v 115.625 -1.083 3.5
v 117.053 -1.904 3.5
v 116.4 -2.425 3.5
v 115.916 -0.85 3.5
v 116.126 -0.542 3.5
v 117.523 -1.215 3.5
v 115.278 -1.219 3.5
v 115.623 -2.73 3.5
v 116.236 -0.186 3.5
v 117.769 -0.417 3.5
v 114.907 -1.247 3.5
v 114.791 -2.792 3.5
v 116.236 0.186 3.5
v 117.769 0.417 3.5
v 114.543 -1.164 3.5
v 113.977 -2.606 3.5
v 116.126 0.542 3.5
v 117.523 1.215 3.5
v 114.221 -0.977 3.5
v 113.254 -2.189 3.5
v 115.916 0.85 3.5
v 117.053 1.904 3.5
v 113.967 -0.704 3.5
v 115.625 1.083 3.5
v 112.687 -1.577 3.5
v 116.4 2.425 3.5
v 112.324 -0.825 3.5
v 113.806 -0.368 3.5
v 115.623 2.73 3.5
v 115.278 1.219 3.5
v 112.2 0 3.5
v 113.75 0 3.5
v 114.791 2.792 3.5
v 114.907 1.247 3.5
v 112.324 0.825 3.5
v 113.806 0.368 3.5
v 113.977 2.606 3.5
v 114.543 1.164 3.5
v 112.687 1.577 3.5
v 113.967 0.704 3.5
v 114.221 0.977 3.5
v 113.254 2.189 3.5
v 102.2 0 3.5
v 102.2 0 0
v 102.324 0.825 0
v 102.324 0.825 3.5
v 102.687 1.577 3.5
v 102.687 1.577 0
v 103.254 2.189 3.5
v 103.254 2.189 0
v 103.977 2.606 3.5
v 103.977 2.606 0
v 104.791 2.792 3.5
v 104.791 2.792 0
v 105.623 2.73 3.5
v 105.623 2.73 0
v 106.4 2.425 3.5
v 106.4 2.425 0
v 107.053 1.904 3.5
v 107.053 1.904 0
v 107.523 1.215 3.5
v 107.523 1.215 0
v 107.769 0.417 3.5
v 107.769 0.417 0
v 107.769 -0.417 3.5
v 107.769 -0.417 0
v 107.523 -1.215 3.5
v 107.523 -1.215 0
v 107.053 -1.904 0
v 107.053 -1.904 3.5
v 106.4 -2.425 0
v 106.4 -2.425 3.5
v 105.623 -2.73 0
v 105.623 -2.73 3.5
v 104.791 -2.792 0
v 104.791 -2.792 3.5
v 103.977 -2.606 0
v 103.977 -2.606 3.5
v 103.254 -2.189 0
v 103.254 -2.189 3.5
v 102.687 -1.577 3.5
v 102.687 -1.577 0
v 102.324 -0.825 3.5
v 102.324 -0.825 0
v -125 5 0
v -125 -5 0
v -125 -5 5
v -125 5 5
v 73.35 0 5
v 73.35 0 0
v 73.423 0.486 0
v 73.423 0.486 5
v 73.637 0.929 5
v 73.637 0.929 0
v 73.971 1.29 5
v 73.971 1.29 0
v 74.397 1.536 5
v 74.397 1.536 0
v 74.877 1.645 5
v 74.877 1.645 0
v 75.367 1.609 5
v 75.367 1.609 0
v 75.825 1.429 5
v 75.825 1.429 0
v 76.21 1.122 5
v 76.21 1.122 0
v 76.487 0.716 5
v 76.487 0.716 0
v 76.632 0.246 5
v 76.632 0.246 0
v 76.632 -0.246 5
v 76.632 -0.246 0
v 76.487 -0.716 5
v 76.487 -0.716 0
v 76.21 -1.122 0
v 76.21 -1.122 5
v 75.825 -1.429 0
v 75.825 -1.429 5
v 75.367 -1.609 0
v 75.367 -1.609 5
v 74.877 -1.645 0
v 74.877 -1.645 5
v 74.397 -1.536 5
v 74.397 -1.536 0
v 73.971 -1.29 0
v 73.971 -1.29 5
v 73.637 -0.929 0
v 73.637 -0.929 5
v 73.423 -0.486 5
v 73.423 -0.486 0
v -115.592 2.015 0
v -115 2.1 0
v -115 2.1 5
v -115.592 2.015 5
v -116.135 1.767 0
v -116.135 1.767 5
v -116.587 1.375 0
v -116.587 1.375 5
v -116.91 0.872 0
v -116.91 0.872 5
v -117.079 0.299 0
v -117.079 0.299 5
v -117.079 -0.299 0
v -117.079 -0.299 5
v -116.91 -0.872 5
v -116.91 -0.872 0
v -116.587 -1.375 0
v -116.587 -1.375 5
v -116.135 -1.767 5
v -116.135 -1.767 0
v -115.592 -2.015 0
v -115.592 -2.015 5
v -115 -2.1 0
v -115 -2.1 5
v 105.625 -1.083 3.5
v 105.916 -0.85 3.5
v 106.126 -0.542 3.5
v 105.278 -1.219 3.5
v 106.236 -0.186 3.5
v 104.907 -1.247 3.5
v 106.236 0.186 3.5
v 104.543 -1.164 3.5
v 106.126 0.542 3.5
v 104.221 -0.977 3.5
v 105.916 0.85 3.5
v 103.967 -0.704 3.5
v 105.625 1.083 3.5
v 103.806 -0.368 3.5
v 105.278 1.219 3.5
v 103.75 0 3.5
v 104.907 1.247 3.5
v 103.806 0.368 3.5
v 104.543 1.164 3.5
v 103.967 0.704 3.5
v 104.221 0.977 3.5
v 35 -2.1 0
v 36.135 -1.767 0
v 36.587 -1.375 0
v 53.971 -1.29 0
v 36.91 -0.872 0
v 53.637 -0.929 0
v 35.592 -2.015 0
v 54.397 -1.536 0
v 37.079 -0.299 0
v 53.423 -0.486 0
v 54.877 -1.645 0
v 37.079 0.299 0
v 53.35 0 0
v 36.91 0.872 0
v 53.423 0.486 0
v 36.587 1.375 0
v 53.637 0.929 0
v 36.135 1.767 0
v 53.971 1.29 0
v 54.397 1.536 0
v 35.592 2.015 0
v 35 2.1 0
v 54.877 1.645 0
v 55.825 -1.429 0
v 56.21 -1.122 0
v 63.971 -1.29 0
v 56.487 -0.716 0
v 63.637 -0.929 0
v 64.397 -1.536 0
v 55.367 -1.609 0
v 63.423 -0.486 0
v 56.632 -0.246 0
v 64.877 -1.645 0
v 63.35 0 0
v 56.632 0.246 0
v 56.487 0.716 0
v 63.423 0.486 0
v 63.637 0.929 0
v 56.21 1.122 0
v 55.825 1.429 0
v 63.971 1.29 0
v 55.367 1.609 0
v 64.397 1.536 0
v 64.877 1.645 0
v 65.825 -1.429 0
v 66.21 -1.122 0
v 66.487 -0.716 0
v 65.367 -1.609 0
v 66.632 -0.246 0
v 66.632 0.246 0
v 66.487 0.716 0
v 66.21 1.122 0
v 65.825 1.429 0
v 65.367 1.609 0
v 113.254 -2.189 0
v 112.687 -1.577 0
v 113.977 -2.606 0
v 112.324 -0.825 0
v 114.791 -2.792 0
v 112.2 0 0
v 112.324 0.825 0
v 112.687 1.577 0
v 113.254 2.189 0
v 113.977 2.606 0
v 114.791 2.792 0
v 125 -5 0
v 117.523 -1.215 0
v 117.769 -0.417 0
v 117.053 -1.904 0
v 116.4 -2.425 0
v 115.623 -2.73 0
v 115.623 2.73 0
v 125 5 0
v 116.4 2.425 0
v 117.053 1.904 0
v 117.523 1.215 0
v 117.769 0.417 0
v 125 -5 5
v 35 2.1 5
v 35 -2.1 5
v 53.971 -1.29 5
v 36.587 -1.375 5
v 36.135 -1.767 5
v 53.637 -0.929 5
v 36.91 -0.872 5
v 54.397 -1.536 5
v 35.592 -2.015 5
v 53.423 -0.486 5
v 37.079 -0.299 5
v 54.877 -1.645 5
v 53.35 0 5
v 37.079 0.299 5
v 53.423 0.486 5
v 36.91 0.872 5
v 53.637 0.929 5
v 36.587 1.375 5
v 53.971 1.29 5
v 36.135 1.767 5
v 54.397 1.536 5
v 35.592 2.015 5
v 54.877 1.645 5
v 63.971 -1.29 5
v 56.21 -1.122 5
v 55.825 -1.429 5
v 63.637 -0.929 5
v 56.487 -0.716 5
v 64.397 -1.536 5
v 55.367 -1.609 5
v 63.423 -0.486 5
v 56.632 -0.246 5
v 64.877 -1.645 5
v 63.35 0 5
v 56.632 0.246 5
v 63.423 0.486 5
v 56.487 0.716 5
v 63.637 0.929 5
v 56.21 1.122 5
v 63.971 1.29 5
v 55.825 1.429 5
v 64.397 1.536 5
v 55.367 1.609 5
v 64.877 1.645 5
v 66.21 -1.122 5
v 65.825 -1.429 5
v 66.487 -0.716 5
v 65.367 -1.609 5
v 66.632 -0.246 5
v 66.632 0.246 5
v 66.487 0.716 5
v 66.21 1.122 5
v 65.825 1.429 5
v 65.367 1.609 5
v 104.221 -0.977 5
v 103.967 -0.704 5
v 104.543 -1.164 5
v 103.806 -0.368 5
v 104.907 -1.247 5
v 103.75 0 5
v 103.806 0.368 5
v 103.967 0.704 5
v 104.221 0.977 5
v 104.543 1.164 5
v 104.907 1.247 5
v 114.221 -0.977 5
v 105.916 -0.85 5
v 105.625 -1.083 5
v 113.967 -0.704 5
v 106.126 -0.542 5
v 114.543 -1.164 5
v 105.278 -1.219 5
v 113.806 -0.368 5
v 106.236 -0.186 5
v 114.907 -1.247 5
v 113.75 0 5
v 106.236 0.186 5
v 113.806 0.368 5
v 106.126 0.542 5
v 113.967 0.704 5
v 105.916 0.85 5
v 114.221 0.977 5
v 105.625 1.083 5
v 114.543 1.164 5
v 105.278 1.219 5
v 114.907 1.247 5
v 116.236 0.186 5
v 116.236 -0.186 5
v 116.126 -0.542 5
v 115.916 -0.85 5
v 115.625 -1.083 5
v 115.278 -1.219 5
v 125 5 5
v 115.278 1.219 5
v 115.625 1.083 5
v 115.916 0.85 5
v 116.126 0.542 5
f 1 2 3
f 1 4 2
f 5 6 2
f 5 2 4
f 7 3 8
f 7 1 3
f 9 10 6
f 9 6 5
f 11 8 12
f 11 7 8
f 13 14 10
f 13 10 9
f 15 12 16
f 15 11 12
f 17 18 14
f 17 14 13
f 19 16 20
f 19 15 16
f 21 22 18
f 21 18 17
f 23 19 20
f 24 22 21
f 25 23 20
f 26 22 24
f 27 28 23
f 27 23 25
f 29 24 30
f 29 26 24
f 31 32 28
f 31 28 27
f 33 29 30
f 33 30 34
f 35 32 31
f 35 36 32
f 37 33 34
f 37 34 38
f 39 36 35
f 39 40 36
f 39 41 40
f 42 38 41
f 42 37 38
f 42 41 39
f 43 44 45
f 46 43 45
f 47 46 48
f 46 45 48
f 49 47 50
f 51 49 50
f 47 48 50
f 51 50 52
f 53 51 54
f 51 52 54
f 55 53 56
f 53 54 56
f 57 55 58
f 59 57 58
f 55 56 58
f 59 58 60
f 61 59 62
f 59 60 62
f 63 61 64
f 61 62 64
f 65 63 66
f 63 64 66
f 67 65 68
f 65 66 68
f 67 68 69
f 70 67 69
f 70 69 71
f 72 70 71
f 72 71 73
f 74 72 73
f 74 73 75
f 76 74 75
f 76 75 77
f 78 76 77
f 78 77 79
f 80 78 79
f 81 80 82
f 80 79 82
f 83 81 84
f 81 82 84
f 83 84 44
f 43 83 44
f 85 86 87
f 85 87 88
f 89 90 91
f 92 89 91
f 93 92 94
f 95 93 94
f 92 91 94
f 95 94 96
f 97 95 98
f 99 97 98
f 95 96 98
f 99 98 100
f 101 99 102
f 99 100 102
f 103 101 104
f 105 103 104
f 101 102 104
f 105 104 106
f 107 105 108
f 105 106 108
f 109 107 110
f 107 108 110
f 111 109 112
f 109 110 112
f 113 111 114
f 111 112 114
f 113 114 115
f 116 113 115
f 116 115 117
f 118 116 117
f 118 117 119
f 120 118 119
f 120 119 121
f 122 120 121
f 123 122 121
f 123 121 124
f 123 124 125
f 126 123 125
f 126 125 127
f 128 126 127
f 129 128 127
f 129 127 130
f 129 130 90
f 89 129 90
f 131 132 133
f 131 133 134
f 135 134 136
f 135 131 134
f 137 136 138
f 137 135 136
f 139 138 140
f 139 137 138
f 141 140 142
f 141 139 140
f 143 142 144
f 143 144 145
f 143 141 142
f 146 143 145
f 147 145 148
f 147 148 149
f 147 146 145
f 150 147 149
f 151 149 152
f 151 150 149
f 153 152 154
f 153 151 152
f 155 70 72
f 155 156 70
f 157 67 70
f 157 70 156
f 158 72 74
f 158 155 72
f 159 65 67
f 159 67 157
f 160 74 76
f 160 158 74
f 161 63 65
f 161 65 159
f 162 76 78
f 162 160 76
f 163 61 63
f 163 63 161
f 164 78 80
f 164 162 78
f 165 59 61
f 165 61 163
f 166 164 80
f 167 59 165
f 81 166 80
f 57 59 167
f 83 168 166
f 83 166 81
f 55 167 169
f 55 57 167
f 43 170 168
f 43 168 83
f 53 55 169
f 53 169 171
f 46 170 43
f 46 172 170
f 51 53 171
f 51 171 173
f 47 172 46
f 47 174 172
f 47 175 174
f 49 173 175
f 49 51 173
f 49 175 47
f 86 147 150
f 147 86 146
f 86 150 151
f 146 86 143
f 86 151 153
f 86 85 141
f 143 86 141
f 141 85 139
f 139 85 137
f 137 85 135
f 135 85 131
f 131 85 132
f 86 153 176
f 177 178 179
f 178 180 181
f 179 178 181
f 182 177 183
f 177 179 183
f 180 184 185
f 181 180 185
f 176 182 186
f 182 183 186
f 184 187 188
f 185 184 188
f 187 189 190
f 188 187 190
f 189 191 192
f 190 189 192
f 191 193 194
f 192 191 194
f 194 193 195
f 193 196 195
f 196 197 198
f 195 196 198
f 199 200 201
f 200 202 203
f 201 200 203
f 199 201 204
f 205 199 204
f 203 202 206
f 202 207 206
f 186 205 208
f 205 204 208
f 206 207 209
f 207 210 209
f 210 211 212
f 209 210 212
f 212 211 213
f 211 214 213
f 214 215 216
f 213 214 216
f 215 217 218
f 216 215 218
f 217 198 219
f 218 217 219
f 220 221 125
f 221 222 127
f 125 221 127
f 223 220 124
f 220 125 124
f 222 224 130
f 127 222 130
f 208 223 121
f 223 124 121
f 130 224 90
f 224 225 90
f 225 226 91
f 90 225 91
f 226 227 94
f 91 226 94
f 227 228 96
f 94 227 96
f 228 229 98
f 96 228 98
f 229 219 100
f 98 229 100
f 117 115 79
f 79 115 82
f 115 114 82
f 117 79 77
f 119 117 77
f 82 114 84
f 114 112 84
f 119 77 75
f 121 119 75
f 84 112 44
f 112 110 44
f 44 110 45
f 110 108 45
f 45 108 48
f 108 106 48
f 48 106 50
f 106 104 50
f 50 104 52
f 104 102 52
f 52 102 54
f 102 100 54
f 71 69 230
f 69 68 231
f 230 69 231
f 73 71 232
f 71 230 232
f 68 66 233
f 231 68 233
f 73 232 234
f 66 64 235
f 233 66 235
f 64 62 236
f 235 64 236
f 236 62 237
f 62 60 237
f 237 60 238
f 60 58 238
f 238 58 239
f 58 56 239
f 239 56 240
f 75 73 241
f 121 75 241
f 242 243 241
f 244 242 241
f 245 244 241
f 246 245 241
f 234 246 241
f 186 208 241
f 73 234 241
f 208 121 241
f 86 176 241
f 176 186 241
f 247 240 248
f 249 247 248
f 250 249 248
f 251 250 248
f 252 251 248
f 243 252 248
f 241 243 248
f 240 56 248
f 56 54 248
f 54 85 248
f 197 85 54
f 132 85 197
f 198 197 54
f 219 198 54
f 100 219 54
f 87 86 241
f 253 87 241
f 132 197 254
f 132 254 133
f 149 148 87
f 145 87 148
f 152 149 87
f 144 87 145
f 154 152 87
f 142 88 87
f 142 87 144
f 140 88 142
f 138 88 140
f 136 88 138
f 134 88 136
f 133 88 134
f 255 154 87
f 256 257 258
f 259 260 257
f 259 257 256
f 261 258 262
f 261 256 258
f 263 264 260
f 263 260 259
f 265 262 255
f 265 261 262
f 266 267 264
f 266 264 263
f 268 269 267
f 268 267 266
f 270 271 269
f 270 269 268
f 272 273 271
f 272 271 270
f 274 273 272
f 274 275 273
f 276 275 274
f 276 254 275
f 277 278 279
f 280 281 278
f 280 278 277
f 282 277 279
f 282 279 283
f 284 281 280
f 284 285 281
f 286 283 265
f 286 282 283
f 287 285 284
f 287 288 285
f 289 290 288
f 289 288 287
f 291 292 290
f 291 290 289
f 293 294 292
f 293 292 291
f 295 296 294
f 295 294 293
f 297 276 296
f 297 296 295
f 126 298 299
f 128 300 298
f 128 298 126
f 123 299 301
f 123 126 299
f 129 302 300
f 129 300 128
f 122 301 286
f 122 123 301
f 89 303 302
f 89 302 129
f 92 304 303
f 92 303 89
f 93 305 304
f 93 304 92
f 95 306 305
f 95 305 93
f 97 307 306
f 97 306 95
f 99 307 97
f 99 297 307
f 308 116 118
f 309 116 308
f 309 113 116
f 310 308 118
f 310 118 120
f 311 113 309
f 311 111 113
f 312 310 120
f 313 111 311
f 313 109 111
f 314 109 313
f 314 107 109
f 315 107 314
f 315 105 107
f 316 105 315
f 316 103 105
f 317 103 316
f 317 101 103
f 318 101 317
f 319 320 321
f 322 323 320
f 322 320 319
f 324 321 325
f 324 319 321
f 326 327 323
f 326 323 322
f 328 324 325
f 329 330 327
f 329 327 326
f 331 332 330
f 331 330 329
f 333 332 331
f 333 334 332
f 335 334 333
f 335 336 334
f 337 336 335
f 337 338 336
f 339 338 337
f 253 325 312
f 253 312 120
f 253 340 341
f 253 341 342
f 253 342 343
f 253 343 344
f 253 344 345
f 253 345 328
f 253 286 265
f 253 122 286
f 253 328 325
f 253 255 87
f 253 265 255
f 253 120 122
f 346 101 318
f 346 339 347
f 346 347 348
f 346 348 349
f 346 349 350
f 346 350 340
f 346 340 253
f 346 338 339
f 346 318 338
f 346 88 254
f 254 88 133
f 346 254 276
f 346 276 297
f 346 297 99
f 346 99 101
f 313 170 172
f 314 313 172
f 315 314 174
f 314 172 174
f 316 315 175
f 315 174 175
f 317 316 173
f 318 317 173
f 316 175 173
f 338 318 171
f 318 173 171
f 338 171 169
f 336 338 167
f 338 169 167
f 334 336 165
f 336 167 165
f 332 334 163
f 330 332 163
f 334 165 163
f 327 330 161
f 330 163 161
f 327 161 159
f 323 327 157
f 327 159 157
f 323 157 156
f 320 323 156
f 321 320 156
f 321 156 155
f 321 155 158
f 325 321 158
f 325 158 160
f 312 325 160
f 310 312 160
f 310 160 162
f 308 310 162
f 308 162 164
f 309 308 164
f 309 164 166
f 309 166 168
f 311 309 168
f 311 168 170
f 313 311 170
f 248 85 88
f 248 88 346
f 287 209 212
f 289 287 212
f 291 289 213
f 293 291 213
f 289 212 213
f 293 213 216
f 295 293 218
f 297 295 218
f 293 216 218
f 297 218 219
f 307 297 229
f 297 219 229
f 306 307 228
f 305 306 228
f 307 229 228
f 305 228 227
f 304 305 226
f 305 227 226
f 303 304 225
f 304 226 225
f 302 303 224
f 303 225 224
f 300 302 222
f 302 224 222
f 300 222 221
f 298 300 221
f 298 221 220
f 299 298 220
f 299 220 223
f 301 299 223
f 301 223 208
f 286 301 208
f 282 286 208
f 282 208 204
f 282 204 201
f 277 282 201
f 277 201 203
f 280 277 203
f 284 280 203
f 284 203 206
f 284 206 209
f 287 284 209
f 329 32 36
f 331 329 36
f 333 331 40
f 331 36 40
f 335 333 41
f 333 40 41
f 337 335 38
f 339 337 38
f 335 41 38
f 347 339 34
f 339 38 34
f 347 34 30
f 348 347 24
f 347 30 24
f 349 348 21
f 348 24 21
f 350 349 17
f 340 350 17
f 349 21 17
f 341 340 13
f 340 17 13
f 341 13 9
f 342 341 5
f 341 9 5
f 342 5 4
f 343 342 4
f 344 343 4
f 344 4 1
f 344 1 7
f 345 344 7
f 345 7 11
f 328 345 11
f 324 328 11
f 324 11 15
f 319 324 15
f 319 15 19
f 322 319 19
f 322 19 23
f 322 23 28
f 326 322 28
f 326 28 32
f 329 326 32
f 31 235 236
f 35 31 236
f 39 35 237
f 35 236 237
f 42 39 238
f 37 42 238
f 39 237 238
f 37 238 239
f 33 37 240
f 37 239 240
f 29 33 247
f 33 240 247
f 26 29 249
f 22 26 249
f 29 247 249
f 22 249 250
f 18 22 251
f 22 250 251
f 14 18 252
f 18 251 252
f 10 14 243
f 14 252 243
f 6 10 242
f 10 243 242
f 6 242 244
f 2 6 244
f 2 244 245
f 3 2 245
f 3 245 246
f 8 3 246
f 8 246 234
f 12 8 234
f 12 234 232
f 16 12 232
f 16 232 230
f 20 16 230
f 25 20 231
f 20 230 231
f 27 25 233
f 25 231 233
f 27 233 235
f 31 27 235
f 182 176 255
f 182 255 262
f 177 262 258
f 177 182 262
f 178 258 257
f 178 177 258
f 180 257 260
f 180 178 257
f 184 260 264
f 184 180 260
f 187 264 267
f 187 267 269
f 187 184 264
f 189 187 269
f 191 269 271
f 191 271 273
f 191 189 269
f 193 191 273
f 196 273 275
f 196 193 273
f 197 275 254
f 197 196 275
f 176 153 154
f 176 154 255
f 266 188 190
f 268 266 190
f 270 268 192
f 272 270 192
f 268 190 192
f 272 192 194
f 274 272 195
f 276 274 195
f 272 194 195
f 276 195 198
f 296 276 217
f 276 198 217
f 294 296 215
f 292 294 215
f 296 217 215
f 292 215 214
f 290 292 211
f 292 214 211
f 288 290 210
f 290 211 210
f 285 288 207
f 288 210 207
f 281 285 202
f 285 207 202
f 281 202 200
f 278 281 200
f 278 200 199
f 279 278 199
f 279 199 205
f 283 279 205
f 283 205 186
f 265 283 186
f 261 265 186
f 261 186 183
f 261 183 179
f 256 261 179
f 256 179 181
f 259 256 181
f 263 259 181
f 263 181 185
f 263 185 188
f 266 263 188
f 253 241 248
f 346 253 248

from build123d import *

# Parameters (mm, degrees)
SKETCH_1_W          = 250
SKETCH_1_H          = 10
EXTRUDE_1_DEPTH     = 5
CUT_EXTRUDE_1_DEPTH = 5
SKETCH_3_R          = 1.25
CUT_EXTRUDE_2_DEPTH = 5
SKETCH_4_R          = 2.8
CUT_EXTRUDE_3_DEPTH = 3.5
SKETCH_5_R          = 1.65
CUT_EXTRUDE_4_DEPTH = 10


with BuildPart() as part:
    # Эскиз1 → Бобышка-Вытянуть1 (new body)
    with BuildSketch(Plane.XY):
        Rectangle(SKETCH_1_W, SKETCH_1_H)
    extrude(amount=EXTRUDE_1_DEPTH)

    # Эскиз2 → Вырез-Вытянуть1 (cut)
    with BuildSketch(Plane(origin=(0, 0, 0), x_dir=(-1, 0, 0), z_dir=(0, 0, -1))):
        with BuildLine():
            Line((-35, 2.1), (115, 2.1))
            ThreePointArc((115, 2.1), (117.1, 0), (115, -2.1))
            Line((115, -2.1), (-35, -2.1))
            ThreePointArc((-35, -2.1), (-37.1, 0), (-35, 2.1))
        make_face()
    extrude(amount=-CUT_EXTRUDE_1_DEPTH, mode=Mode.SUBTRACT)

    # Эскиз3 → Вырез-Вытянуть2 (cut)
    with BuildSketch(Plane(origin=(0, 0, 0), x_dir=(-1, 0, 0), z_dir=(0, 0, -1))):
        with Locations((-115, 0)):
            Circle(SKETCH_3_R)
        with Locations((-105, 0)):
            Circle(SKETCH_3_R)
    extrude(amount=-CUT_EXTRUDE_2_DEPTH, mode=Mode.SUBTRACT)

    # Эскиз4 → Вырез-Вытянуть3 (cut)
    with BuildSketch(Plane(origin=(0, 0, 0), x_dir=(-1, 0, 0), z_dir=(0, 0, -1))):
        with Locations((-115, 0)):
            Circle(SKETCH_4_R)
        with Locations((-105, 0)):
            Circle(SKETCH_4_R)
    extrude(amount=-CUT_EXTRUDE_3_DEPTH, mode=Mode.SUBTRACT)

    # Эскиз5 → Вырез-Вытянуть4 (cut)
    with BuildSketch(Plane(origin=(0, 0, 0), x_dir=(-1, 0, 0), z_dir=(0, 0, -1))):
        with Locations((-75, 0)):
            Circle(SKETCH_5_R)
        with Locations((-65, 0)):
            Circle(SKETCH_5_R)
        with Locations((-55, 0)):
            Circle(SKETCH_5_R)
    extrude(amount=-CUT_EXTRUDE_4_DEPTH, mode=Mode.SUBTRACT)


solid = part.part
